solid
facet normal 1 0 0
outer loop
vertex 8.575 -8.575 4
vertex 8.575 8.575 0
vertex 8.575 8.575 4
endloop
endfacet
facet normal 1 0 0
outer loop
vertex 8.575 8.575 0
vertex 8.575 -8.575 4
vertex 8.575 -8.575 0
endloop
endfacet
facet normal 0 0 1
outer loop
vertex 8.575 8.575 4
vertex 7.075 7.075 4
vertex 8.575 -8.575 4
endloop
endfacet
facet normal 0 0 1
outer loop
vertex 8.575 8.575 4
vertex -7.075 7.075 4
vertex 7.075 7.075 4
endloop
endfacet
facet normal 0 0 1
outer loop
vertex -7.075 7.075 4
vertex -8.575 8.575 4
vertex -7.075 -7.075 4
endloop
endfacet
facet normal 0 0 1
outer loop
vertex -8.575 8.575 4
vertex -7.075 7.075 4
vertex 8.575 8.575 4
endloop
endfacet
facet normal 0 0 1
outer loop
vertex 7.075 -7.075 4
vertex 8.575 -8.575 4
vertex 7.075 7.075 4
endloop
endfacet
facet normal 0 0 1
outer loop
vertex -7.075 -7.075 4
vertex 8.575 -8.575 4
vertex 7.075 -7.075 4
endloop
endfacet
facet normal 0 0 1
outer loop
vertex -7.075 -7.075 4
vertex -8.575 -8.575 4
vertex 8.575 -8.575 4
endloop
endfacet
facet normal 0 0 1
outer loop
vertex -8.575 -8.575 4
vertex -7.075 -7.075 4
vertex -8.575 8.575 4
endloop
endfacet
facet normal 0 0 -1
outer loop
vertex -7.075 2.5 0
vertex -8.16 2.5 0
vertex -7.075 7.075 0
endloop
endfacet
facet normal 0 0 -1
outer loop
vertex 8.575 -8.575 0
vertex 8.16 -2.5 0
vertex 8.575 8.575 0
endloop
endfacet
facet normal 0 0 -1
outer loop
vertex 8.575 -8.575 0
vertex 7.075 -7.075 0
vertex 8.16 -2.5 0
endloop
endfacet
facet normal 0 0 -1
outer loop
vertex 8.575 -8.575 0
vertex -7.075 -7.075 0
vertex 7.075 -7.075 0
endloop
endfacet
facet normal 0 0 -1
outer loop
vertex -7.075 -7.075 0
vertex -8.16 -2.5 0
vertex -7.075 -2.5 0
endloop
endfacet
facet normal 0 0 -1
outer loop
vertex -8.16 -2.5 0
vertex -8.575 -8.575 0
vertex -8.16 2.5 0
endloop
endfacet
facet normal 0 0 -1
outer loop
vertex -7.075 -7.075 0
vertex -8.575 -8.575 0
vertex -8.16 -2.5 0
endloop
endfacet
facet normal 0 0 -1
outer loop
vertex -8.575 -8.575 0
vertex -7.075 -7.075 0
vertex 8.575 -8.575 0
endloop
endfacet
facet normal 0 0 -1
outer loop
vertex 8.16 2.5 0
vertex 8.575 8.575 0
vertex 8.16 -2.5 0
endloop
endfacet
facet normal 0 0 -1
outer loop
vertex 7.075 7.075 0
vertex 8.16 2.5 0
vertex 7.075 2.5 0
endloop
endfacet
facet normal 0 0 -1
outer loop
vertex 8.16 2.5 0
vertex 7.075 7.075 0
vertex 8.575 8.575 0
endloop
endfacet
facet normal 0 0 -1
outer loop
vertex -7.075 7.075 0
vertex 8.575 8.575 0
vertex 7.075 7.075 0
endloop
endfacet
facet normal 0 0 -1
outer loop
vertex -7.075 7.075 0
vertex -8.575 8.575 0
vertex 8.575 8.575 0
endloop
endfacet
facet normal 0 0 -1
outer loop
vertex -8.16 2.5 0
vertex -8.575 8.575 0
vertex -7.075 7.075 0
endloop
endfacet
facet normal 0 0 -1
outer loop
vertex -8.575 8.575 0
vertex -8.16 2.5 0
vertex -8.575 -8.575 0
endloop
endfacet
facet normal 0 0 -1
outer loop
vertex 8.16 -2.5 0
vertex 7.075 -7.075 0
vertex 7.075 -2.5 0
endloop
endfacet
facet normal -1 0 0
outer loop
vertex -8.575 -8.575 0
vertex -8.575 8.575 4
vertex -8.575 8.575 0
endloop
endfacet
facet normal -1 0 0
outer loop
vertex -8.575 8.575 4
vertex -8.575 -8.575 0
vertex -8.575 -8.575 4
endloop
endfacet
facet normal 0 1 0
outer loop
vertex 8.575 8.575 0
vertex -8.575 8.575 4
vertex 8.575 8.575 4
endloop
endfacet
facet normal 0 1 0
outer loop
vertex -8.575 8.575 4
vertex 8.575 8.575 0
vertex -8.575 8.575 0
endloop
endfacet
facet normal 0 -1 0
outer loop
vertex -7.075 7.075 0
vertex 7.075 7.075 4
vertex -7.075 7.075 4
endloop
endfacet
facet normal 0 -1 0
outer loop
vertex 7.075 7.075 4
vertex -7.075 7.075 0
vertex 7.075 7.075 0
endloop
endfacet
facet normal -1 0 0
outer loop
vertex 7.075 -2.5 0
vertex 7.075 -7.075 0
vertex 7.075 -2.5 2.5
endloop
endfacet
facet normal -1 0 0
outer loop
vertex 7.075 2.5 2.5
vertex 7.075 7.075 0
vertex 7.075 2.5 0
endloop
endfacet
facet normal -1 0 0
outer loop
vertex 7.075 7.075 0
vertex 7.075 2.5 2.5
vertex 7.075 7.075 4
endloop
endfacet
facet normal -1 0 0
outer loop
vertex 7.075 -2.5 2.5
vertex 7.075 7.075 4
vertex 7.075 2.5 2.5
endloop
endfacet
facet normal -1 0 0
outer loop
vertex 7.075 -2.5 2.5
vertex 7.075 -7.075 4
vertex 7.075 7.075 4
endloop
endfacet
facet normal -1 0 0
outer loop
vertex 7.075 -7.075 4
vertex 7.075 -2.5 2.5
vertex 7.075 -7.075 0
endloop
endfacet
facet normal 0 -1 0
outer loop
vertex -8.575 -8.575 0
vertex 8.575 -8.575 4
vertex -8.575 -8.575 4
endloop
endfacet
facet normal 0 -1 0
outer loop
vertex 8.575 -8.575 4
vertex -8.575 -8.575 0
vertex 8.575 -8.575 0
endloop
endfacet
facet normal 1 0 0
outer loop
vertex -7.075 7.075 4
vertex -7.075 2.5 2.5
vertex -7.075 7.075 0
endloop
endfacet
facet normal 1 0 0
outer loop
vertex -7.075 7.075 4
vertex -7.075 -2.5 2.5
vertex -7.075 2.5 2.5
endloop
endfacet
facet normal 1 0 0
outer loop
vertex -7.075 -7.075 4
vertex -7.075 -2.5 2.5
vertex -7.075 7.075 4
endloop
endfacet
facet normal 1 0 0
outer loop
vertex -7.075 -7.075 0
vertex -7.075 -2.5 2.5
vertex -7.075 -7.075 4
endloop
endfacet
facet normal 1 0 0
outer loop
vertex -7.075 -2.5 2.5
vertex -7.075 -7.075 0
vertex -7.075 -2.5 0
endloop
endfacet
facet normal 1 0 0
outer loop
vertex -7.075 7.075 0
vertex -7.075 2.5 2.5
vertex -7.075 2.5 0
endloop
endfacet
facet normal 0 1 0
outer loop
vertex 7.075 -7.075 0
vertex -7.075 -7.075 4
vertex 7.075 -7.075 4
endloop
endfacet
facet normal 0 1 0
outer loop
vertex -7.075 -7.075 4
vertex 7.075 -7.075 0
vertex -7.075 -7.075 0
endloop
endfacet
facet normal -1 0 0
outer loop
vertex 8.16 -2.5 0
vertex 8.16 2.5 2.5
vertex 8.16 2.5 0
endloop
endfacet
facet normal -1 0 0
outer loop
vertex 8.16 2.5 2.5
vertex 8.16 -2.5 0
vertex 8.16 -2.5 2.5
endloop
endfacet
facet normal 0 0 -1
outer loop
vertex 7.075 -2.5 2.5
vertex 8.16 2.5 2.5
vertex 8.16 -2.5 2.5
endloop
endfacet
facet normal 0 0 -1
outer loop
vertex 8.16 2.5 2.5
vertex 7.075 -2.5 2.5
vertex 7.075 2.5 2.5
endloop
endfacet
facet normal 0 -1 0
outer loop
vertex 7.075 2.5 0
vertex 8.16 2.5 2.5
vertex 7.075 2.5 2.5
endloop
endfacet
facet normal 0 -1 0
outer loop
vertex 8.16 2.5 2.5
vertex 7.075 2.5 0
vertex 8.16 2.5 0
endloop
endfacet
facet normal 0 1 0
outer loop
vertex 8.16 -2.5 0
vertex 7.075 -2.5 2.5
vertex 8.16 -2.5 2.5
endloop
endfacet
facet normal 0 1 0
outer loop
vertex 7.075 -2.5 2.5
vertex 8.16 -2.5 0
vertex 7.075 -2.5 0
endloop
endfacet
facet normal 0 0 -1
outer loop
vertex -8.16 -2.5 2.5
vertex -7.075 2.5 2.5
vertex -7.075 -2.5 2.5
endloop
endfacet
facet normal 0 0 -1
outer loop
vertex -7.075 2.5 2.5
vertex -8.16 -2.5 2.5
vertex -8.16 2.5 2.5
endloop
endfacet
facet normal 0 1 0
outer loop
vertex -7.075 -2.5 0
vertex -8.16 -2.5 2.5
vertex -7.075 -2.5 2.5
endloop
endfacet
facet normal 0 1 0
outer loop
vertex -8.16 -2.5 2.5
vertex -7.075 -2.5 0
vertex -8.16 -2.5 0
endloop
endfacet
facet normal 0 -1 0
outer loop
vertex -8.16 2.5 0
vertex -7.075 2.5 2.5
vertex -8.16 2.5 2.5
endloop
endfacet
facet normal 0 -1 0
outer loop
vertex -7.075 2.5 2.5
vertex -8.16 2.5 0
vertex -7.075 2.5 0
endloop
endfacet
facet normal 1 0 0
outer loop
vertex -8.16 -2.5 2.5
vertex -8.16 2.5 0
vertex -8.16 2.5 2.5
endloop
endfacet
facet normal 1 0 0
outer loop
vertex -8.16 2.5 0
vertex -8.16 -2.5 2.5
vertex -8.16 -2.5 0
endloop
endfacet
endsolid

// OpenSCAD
$fa=12.000000;
$fs=2.000000;
$fn=0;
difference(){
union(){
union(){
translate([0.000000, 7.825000, 2.000000]) {
cube([17.150000, 1.500000, 4.000000], center=true);
}
translate([7.825000, 0.000000, 2.000000]) {
cube([1.500000, 17.150000, 4.000000], center=true);
}
}
mirror([1.000000, 0.000000, 0.000000]) {
union(){
translate([0.000000, 7.825000, 2.000000]) {
cube([17.150000, 1.500000, 4.000000], center=true);
}
translate([7.825000, 0.000000, 2.000000]) {
cube([1.500000, 17.150000, 4.000000], center=true);
}
}
}
mirror([0.000000, 1.000000, 0.000000]) {
union(){
translate([0.000000, 7.825000, 2.000000]) {
cube([17.150000, 1.500000, 4.000000], center=true);
}
translate([7.825000, 0.000000, 2.000000]) {
cube([1.500000, 17.150000, 4.000000], center=true);
}
}
}
}
union(){
translate([5.660000, 0.000000, 1.250000]) {
cube([5.000000, 5.000000, 2.500000], center=true);
}
mirror([1.000000, 0.000000, 0.000000]) {
translate([5.660000, 0.000000, 1.250000]) {
cube([5.000000, 5.000000, 2.500000], center=true);
}
}
mirror([0.000000, 1.000000, 0.000000]) {
translate([5.660000, 0.000000, 1.250000]) {
cube([5.000000, 5.000000, 2.500000], center=true);
}
}
}
}
